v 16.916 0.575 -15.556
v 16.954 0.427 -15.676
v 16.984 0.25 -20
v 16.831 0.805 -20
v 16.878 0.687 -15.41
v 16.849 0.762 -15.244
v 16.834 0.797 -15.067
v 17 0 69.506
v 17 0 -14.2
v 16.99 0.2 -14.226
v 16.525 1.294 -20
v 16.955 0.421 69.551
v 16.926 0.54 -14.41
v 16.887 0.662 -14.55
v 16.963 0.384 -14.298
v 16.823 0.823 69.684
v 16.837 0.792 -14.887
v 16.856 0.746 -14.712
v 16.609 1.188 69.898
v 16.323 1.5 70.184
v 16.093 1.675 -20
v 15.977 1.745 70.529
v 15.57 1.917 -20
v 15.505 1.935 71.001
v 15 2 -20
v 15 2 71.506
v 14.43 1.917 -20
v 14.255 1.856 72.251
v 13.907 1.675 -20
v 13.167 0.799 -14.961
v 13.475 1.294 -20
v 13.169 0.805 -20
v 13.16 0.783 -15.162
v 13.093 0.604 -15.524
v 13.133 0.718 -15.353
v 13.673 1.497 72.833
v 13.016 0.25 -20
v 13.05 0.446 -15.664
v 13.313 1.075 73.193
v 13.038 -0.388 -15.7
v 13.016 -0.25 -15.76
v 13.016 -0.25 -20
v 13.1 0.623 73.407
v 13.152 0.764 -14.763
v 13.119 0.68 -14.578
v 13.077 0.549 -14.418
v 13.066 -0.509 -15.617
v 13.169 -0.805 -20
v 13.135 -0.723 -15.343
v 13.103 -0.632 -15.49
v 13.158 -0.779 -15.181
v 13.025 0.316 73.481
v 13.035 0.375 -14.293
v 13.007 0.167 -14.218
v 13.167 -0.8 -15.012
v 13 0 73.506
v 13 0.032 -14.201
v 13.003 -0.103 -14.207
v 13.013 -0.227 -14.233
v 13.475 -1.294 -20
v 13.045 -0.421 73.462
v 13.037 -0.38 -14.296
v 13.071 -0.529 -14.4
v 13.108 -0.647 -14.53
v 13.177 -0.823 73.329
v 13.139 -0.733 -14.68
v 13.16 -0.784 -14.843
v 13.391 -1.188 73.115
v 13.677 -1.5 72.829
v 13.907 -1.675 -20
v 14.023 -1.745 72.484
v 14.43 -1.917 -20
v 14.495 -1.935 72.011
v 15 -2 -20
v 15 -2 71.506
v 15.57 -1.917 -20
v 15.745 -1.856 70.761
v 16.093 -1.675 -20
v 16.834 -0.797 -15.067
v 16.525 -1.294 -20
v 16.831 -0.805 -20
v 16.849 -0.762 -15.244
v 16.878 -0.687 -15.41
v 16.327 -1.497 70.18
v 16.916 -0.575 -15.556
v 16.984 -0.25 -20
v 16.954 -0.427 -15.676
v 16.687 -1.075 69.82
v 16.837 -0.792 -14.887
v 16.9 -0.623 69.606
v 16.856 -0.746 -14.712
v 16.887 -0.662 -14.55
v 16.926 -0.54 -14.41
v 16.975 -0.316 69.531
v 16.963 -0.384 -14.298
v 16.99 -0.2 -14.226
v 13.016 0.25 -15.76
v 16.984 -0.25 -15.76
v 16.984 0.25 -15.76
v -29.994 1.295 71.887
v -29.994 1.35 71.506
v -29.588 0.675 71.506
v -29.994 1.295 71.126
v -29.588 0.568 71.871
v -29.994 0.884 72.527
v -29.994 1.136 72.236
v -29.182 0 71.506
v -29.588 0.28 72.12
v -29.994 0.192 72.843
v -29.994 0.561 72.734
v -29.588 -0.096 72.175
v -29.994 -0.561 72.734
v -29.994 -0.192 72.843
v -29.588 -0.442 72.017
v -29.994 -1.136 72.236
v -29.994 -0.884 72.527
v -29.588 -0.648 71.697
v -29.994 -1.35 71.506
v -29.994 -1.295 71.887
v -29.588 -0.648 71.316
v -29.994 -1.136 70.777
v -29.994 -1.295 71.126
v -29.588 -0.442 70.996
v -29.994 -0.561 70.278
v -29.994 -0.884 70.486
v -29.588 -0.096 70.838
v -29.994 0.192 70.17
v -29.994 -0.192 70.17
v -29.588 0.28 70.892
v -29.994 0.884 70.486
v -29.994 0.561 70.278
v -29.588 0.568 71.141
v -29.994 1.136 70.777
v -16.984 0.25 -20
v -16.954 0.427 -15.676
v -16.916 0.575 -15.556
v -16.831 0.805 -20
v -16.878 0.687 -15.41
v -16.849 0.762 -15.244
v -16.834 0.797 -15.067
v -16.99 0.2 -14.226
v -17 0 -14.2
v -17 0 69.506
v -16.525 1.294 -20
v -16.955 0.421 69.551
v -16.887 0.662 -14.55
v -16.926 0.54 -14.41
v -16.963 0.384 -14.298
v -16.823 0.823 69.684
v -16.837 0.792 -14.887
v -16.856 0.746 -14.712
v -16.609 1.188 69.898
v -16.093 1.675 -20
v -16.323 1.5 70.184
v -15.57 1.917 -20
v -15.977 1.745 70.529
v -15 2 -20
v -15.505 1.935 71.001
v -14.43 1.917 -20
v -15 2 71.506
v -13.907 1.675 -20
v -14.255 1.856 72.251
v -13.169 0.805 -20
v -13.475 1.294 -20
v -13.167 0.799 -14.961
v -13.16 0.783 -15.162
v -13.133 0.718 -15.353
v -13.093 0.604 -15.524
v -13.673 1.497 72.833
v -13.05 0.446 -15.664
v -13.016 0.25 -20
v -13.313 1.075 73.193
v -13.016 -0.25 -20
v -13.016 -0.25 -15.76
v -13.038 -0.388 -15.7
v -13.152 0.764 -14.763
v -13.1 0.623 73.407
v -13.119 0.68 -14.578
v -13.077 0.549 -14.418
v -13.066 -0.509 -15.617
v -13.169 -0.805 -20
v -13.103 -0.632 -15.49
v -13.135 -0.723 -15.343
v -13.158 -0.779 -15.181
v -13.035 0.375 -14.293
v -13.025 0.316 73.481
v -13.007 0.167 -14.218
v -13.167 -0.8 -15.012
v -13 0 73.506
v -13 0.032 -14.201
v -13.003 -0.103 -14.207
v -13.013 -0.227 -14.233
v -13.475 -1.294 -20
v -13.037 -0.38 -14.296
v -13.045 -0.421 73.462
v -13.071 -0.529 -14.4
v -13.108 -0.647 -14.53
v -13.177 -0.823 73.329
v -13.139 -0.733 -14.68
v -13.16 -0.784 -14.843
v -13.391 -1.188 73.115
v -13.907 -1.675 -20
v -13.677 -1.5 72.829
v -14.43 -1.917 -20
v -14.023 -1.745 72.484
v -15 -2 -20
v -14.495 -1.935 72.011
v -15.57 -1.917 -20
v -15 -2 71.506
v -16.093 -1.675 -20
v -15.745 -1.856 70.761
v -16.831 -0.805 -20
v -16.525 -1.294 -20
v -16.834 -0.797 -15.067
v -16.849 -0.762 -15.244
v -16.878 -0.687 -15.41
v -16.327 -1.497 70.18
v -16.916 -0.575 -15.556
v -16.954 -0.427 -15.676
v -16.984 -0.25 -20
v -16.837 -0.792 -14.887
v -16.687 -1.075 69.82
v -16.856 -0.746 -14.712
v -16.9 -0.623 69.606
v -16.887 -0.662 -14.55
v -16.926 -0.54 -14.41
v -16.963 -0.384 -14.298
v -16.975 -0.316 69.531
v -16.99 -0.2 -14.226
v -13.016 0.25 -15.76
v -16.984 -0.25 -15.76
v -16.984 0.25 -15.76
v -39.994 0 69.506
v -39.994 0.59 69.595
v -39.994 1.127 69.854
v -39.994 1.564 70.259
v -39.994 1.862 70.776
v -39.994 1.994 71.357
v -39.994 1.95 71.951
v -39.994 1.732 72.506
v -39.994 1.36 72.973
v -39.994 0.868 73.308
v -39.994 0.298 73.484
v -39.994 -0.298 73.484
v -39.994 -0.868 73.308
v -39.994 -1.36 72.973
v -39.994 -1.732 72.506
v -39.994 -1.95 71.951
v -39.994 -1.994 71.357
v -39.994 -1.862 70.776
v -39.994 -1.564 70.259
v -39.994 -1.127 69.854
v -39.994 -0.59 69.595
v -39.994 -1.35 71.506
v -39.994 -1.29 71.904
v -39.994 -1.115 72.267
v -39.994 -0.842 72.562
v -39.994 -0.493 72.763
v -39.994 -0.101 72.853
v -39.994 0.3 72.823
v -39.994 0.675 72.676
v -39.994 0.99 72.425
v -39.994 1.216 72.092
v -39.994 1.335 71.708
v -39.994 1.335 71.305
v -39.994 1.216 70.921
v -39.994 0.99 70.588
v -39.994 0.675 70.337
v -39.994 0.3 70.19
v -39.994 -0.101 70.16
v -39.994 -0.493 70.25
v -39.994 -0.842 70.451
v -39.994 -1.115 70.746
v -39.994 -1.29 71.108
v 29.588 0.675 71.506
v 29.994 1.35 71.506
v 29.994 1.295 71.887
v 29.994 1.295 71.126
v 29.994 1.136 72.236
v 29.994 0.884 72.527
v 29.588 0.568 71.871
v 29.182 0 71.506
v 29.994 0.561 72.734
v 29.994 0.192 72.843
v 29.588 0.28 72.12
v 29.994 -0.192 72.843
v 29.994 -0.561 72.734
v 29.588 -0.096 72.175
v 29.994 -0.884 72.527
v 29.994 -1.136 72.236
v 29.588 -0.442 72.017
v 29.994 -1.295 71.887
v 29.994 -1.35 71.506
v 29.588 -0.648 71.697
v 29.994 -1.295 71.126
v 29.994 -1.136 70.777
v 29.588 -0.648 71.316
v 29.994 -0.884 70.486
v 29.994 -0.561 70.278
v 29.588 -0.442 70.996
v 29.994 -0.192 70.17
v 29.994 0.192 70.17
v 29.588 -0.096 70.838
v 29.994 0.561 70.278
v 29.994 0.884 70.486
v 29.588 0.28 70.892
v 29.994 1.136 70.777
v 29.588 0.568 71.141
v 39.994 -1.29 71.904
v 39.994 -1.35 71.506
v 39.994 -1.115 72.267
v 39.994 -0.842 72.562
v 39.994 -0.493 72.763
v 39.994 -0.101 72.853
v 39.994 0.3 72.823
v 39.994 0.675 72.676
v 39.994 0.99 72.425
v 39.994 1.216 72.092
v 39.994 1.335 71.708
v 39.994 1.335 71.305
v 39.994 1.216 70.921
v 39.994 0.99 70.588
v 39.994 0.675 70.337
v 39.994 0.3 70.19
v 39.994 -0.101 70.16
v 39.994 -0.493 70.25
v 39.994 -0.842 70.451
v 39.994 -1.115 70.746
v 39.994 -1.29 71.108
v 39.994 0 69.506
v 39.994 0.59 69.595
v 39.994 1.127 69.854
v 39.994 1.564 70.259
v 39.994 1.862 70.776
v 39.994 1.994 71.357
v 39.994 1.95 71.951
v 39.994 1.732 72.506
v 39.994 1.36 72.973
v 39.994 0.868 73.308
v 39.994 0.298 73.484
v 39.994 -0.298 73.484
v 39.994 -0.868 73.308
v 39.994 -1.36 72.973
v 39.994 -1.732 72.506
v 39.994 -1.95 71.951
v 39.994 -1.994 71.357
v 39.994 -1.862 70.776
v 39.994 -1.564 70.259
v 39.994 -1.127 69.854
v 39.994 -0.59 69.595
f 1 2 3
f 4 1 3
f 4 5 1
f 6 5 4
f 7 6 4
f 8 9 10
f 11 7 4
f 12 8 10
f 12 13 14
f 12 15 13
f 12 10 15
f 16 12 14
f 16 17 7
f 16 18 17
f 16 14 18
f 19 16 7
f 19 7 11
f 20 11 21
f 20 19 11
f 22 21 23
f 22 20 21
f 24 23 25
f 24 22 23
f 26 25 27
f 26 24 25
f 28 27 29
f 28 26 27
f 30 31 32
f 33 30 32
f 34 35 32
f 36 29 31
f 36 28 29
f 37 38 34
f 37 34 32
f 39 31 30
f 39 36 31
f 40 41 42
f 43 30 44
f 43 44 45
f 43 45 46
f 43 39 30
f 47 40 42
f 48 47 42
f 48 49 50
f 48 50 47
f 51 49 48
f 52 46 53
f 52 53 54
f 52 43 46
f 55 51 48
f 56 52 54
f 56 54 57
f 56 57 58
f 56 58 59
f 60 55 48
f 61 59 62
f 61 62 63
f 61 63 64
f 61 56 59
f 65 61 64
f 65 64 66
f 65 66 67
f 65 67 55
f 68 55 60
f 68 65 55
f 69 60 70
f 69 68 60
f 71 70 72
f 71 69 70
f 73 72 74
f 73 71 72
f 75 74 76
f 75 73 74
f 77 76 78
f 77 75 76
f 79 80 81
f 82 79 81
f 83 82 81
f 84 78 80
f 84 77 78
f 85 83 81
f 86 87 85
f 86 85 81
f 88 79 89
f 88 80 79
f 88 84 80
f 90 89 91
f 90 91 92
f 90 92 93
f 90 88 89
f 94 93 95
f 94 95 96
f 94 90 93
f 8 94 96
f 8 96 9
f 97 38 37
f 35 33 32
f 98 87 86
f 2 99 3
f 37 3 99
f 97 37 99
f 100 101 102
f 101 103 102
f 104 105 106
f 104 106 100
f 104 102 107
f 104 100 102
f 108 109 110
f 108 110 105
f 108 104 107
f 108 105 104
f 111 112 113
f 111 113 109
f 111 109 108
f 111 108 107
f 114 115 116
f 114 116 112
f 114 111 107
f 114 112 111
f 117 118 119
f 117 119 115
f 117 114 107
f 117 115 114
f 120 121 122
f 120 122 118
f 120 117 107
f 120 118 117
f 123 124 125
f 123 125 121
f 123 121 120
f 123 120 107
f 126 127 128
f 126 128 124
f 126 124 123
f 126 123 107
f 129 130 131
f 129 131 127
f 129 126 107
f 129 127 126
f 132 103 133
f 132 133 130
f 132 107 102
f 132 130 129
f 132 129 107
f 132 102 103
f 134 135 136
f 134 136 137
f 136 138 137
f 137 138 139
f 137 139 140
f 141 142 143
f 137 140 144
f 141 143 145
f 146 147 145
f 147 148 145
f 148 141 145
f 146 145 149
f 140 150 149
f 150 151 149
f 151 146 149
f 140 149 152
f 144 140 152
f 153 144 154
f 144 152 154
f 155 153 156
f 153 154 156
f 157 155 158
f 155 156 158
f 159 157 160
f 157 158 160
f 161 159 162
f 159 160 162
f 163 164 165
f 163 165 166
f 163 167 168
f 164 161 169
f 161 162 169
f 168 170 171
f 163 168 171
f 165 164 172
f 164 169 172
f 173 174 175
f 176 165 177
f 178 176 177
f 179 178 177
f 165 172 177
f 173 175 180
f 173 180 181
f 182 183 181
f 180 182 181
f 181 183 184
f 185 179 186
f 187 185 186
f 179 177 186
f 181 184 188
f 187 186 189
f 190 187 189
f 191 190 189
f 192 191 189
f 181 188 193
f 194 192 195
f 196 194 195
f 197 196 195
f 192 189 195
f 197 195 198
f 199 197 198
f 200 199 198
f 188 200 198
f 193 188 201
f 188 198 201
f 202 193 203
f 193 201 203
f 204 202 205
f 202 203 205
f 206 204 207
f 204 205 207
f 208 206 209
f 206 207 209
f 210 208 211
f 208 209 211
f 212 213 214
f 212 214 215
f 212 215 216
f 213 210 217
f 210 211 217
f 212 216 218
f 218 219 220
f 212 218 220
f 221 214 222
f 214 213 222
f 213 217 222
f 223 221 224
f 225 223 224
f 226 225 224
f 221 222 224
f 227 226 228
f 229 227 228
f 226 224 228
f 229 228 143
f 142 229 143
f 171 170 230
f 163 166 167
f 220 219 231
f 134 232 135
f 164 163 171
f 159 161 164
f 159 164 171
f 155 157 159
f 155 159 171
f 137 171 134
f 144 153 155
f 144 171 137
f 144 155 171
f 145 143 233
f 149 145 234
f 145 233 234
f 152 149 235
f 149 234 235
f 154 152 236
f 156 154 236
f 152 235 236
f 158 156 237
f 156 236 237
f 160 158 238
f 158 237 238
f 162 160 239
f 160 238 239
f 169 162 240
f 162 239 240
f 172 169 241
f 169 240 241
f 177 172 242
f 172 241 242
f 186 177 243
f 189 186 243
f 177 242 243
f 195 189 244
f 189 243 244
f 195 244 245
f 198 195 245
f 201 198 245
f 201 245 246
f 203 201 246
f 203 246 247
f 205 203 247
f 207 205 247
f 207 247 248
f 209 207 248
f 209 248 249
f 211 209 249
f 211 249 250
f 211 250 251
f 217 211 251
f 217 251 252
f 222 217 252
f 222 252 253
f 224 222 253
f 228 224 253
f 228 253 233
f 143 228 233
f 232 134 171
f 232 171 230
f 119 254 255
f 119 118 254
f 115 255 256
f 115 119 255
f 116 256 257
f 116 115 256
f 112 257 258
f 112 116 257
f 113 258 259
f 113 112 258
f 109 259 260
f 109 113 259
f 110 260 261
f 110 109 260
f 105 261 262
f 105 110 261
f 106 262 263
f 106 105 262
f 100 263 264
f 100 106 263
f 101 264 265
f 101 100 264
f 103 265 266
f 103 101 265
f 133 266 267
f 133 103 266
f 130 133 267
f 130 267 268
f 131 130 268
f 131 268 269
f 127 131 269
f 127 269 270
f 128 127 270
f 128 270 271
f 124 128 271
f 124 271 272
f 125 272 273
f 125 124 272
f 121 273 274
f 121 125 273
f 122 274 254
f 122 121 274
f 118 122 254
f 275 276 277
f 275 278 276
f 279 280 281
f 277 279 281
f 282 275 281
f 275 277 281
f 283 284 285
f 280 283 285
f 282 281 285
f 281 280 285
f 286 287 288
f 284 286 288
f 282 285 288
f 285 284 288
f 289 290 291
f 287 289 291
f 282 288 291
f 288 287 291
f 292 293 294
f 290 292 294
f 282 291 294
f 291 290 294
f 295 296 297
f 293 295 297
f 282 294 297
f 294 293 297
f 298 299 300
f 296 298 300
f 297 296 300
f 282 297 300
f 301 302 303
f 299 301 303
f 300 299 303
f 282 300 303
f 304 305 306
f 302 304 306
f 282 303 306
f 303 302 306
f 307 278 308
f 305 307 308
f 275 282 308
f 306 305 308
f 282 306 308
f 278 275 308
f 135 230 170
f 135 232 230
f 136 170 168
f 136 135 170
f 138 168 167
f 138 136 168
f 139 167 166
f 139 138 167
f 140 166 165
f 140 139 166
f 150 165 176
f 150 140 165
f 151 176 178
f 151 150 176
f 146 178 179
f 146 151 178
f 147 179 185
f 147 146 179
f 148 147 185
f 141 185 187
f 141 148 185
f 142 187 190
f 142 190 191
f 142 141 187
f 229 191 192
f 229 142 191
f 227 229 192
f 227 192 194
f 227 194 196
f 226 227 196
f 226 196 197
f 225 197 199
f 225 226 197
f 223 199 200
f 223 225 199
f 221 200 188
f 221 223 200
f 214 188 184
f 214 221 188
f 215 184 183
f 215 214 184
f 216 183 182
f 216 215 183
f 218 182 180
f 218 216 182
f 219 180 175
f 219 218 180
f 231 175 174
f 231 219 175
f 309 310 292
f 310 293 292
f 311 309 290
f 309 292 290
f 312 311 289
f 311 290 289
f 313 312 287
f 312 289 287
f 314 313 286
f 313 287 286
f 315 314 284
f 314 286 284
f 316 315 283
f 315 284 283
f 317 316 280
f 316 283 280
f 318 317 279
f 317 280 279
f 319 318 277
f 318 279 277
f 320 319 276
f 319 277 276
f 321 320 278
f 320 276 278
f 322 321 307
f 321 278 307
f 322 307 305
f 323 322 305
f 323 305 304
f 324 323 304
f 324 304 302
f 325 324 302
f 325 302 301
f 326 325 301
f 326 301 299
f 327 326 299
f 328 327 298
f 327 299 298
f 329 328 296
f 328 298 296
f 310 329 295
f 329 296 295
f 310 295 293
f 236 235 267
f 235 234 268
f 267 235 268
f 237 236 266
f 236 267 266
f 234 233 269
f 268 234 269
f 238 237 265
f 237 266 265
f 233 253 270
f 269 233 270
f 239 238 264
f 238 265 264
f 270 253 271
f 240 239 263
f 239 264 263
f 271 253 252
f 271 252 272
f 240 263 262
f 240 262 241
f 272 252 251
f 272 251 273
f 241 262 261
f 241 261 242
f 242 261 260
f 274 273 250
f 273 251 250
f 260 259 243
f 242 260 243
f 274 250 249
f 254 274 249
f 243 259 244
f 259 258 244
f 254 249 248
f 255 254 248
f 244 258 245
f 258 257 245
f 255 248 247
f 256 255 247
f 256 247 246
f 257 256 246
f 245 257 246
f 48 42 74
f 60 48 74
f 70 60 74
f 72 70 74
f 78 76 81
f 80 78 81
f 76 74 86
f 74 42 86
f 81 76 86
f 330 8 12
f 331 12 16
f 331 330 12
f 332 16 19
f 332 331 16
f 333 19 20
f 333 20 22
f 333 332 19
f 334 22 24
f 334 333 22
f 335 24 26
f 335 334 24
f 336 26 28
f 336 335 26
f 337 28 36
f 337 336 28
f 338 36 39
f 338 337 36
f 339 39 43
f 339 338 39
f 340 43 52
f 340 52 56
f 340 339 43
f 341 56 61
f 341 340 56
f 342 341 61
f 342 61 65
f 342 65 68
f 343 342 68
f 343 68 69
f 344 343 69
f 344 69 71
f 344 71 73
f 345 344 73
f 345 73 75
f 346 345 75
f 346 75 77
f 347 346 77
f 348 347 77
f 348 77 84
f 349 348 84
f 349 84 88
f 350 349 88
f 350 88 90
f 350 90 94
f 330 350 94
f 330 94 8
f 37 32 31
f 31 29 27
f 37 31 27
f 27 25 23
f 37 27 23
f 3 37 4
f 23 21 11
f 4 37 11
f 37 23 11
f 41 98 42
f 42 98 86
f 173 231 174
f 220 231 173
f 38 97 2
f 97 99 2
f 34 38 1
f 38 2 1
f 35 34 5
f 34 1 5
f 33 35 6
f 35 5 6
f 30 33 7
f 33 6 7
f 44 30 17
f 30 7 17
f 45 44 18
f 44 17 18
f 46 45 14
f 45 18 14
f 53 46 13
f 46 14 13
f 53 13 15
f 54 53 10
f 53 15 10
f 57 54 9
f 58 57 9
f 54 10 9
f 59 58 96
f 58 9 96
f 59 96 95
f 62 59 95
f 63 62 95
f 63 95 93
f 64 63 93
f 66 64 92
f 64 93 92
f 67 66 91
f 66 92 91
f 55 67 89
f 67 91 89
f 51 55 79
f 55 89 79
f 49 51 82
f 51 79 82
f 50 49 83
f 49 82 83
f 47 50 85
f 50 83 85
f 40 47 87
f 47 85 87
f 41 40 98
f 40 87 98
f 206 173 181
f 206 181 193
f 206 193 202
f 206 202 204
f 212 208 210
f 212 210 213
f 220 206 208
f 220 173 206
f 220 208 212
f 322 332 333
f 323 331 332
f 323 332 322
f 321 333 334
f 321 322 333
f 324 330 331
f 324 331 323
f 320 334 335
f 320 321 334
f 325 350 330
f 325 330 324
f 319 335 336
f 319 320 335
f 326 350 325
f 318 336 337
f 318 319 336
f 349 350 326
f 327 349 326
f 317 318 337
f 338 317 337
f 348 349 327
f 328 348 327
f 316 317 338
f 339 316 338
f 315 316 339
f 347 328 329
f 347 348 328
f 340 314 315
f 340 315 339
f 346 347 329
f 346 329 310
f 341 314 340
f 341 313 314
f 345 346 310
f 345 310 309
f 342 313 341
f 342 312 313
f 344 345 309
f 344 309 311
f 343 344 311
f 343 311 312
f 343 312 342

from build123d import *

# Parameters (mm, degrees)
F1_R      = 2
F6_D      = 1.6
F7_W      = 0.5
F7_H      = 4.3
F11_D     = 2.7
F11_DEPTH = 10
F11_TIP   = 0.8111618357


with BuildPart() as f3:
    # F3: sweep along a path in F2
    with BuildLine(Plane.XZ) as f3_path:
        Line((15, -19.9935957789), (15, 71.5064042211))
        Line((15, 71.5064042211), (40, 71.5064042211))
    # F1 (on offset) → F3 (sweep)
    with BuildSketch(Plane.XY.offset(-20)):
        with Locations((15, 0)):
            Circle(F1_R)
    sweep(path=f3_path.line, transition=Transition.RIGHT)

    # F6 (through all)
    with Locations(Plane(origin=(13, 0, 0), x_dir=(0, 1, 0), z_dir=(-1, 0, 0))):
        with Locations((0, 15)):
            Hole(F6_D / 2)

    # F9: sweep along a path in F8
    with BuildLine(Plane.XZ) as f9_path:
        Line((12.9777537659, -18.3893050998), (17.0004218817, -18.3893050998))
    # F7 (on offset) → F9 (sweep, cut)
    with BuildSketch(Plane.YZ.offset(13)):
        with Locations((0, -17.85)):
            Rectangle(F7_W, F7_H)
    sweep(path=f9_path.line, mode=Mode.SUBTRACT)

    # F11
    with Locations(Plane.YZ.offset(39.9935957789)):
        with Locations((0, 71.5064042211)):
            Hole(F11_D / 2, depth=F11_DEPTH)
            with Locations((0, 0, -(F11_DEPTH + F11_TIP / 2))):  # 118° drill point
                Cone(0, F11_D / 2, F11_TIP, mode=Mode.SUBTRACT)


with BuildPart() as f12_1:
    # F12: instance of F3
    add(f3.part.mirror(Plane.YZ))


solid = Compound([f3.part, f12_1.part])
